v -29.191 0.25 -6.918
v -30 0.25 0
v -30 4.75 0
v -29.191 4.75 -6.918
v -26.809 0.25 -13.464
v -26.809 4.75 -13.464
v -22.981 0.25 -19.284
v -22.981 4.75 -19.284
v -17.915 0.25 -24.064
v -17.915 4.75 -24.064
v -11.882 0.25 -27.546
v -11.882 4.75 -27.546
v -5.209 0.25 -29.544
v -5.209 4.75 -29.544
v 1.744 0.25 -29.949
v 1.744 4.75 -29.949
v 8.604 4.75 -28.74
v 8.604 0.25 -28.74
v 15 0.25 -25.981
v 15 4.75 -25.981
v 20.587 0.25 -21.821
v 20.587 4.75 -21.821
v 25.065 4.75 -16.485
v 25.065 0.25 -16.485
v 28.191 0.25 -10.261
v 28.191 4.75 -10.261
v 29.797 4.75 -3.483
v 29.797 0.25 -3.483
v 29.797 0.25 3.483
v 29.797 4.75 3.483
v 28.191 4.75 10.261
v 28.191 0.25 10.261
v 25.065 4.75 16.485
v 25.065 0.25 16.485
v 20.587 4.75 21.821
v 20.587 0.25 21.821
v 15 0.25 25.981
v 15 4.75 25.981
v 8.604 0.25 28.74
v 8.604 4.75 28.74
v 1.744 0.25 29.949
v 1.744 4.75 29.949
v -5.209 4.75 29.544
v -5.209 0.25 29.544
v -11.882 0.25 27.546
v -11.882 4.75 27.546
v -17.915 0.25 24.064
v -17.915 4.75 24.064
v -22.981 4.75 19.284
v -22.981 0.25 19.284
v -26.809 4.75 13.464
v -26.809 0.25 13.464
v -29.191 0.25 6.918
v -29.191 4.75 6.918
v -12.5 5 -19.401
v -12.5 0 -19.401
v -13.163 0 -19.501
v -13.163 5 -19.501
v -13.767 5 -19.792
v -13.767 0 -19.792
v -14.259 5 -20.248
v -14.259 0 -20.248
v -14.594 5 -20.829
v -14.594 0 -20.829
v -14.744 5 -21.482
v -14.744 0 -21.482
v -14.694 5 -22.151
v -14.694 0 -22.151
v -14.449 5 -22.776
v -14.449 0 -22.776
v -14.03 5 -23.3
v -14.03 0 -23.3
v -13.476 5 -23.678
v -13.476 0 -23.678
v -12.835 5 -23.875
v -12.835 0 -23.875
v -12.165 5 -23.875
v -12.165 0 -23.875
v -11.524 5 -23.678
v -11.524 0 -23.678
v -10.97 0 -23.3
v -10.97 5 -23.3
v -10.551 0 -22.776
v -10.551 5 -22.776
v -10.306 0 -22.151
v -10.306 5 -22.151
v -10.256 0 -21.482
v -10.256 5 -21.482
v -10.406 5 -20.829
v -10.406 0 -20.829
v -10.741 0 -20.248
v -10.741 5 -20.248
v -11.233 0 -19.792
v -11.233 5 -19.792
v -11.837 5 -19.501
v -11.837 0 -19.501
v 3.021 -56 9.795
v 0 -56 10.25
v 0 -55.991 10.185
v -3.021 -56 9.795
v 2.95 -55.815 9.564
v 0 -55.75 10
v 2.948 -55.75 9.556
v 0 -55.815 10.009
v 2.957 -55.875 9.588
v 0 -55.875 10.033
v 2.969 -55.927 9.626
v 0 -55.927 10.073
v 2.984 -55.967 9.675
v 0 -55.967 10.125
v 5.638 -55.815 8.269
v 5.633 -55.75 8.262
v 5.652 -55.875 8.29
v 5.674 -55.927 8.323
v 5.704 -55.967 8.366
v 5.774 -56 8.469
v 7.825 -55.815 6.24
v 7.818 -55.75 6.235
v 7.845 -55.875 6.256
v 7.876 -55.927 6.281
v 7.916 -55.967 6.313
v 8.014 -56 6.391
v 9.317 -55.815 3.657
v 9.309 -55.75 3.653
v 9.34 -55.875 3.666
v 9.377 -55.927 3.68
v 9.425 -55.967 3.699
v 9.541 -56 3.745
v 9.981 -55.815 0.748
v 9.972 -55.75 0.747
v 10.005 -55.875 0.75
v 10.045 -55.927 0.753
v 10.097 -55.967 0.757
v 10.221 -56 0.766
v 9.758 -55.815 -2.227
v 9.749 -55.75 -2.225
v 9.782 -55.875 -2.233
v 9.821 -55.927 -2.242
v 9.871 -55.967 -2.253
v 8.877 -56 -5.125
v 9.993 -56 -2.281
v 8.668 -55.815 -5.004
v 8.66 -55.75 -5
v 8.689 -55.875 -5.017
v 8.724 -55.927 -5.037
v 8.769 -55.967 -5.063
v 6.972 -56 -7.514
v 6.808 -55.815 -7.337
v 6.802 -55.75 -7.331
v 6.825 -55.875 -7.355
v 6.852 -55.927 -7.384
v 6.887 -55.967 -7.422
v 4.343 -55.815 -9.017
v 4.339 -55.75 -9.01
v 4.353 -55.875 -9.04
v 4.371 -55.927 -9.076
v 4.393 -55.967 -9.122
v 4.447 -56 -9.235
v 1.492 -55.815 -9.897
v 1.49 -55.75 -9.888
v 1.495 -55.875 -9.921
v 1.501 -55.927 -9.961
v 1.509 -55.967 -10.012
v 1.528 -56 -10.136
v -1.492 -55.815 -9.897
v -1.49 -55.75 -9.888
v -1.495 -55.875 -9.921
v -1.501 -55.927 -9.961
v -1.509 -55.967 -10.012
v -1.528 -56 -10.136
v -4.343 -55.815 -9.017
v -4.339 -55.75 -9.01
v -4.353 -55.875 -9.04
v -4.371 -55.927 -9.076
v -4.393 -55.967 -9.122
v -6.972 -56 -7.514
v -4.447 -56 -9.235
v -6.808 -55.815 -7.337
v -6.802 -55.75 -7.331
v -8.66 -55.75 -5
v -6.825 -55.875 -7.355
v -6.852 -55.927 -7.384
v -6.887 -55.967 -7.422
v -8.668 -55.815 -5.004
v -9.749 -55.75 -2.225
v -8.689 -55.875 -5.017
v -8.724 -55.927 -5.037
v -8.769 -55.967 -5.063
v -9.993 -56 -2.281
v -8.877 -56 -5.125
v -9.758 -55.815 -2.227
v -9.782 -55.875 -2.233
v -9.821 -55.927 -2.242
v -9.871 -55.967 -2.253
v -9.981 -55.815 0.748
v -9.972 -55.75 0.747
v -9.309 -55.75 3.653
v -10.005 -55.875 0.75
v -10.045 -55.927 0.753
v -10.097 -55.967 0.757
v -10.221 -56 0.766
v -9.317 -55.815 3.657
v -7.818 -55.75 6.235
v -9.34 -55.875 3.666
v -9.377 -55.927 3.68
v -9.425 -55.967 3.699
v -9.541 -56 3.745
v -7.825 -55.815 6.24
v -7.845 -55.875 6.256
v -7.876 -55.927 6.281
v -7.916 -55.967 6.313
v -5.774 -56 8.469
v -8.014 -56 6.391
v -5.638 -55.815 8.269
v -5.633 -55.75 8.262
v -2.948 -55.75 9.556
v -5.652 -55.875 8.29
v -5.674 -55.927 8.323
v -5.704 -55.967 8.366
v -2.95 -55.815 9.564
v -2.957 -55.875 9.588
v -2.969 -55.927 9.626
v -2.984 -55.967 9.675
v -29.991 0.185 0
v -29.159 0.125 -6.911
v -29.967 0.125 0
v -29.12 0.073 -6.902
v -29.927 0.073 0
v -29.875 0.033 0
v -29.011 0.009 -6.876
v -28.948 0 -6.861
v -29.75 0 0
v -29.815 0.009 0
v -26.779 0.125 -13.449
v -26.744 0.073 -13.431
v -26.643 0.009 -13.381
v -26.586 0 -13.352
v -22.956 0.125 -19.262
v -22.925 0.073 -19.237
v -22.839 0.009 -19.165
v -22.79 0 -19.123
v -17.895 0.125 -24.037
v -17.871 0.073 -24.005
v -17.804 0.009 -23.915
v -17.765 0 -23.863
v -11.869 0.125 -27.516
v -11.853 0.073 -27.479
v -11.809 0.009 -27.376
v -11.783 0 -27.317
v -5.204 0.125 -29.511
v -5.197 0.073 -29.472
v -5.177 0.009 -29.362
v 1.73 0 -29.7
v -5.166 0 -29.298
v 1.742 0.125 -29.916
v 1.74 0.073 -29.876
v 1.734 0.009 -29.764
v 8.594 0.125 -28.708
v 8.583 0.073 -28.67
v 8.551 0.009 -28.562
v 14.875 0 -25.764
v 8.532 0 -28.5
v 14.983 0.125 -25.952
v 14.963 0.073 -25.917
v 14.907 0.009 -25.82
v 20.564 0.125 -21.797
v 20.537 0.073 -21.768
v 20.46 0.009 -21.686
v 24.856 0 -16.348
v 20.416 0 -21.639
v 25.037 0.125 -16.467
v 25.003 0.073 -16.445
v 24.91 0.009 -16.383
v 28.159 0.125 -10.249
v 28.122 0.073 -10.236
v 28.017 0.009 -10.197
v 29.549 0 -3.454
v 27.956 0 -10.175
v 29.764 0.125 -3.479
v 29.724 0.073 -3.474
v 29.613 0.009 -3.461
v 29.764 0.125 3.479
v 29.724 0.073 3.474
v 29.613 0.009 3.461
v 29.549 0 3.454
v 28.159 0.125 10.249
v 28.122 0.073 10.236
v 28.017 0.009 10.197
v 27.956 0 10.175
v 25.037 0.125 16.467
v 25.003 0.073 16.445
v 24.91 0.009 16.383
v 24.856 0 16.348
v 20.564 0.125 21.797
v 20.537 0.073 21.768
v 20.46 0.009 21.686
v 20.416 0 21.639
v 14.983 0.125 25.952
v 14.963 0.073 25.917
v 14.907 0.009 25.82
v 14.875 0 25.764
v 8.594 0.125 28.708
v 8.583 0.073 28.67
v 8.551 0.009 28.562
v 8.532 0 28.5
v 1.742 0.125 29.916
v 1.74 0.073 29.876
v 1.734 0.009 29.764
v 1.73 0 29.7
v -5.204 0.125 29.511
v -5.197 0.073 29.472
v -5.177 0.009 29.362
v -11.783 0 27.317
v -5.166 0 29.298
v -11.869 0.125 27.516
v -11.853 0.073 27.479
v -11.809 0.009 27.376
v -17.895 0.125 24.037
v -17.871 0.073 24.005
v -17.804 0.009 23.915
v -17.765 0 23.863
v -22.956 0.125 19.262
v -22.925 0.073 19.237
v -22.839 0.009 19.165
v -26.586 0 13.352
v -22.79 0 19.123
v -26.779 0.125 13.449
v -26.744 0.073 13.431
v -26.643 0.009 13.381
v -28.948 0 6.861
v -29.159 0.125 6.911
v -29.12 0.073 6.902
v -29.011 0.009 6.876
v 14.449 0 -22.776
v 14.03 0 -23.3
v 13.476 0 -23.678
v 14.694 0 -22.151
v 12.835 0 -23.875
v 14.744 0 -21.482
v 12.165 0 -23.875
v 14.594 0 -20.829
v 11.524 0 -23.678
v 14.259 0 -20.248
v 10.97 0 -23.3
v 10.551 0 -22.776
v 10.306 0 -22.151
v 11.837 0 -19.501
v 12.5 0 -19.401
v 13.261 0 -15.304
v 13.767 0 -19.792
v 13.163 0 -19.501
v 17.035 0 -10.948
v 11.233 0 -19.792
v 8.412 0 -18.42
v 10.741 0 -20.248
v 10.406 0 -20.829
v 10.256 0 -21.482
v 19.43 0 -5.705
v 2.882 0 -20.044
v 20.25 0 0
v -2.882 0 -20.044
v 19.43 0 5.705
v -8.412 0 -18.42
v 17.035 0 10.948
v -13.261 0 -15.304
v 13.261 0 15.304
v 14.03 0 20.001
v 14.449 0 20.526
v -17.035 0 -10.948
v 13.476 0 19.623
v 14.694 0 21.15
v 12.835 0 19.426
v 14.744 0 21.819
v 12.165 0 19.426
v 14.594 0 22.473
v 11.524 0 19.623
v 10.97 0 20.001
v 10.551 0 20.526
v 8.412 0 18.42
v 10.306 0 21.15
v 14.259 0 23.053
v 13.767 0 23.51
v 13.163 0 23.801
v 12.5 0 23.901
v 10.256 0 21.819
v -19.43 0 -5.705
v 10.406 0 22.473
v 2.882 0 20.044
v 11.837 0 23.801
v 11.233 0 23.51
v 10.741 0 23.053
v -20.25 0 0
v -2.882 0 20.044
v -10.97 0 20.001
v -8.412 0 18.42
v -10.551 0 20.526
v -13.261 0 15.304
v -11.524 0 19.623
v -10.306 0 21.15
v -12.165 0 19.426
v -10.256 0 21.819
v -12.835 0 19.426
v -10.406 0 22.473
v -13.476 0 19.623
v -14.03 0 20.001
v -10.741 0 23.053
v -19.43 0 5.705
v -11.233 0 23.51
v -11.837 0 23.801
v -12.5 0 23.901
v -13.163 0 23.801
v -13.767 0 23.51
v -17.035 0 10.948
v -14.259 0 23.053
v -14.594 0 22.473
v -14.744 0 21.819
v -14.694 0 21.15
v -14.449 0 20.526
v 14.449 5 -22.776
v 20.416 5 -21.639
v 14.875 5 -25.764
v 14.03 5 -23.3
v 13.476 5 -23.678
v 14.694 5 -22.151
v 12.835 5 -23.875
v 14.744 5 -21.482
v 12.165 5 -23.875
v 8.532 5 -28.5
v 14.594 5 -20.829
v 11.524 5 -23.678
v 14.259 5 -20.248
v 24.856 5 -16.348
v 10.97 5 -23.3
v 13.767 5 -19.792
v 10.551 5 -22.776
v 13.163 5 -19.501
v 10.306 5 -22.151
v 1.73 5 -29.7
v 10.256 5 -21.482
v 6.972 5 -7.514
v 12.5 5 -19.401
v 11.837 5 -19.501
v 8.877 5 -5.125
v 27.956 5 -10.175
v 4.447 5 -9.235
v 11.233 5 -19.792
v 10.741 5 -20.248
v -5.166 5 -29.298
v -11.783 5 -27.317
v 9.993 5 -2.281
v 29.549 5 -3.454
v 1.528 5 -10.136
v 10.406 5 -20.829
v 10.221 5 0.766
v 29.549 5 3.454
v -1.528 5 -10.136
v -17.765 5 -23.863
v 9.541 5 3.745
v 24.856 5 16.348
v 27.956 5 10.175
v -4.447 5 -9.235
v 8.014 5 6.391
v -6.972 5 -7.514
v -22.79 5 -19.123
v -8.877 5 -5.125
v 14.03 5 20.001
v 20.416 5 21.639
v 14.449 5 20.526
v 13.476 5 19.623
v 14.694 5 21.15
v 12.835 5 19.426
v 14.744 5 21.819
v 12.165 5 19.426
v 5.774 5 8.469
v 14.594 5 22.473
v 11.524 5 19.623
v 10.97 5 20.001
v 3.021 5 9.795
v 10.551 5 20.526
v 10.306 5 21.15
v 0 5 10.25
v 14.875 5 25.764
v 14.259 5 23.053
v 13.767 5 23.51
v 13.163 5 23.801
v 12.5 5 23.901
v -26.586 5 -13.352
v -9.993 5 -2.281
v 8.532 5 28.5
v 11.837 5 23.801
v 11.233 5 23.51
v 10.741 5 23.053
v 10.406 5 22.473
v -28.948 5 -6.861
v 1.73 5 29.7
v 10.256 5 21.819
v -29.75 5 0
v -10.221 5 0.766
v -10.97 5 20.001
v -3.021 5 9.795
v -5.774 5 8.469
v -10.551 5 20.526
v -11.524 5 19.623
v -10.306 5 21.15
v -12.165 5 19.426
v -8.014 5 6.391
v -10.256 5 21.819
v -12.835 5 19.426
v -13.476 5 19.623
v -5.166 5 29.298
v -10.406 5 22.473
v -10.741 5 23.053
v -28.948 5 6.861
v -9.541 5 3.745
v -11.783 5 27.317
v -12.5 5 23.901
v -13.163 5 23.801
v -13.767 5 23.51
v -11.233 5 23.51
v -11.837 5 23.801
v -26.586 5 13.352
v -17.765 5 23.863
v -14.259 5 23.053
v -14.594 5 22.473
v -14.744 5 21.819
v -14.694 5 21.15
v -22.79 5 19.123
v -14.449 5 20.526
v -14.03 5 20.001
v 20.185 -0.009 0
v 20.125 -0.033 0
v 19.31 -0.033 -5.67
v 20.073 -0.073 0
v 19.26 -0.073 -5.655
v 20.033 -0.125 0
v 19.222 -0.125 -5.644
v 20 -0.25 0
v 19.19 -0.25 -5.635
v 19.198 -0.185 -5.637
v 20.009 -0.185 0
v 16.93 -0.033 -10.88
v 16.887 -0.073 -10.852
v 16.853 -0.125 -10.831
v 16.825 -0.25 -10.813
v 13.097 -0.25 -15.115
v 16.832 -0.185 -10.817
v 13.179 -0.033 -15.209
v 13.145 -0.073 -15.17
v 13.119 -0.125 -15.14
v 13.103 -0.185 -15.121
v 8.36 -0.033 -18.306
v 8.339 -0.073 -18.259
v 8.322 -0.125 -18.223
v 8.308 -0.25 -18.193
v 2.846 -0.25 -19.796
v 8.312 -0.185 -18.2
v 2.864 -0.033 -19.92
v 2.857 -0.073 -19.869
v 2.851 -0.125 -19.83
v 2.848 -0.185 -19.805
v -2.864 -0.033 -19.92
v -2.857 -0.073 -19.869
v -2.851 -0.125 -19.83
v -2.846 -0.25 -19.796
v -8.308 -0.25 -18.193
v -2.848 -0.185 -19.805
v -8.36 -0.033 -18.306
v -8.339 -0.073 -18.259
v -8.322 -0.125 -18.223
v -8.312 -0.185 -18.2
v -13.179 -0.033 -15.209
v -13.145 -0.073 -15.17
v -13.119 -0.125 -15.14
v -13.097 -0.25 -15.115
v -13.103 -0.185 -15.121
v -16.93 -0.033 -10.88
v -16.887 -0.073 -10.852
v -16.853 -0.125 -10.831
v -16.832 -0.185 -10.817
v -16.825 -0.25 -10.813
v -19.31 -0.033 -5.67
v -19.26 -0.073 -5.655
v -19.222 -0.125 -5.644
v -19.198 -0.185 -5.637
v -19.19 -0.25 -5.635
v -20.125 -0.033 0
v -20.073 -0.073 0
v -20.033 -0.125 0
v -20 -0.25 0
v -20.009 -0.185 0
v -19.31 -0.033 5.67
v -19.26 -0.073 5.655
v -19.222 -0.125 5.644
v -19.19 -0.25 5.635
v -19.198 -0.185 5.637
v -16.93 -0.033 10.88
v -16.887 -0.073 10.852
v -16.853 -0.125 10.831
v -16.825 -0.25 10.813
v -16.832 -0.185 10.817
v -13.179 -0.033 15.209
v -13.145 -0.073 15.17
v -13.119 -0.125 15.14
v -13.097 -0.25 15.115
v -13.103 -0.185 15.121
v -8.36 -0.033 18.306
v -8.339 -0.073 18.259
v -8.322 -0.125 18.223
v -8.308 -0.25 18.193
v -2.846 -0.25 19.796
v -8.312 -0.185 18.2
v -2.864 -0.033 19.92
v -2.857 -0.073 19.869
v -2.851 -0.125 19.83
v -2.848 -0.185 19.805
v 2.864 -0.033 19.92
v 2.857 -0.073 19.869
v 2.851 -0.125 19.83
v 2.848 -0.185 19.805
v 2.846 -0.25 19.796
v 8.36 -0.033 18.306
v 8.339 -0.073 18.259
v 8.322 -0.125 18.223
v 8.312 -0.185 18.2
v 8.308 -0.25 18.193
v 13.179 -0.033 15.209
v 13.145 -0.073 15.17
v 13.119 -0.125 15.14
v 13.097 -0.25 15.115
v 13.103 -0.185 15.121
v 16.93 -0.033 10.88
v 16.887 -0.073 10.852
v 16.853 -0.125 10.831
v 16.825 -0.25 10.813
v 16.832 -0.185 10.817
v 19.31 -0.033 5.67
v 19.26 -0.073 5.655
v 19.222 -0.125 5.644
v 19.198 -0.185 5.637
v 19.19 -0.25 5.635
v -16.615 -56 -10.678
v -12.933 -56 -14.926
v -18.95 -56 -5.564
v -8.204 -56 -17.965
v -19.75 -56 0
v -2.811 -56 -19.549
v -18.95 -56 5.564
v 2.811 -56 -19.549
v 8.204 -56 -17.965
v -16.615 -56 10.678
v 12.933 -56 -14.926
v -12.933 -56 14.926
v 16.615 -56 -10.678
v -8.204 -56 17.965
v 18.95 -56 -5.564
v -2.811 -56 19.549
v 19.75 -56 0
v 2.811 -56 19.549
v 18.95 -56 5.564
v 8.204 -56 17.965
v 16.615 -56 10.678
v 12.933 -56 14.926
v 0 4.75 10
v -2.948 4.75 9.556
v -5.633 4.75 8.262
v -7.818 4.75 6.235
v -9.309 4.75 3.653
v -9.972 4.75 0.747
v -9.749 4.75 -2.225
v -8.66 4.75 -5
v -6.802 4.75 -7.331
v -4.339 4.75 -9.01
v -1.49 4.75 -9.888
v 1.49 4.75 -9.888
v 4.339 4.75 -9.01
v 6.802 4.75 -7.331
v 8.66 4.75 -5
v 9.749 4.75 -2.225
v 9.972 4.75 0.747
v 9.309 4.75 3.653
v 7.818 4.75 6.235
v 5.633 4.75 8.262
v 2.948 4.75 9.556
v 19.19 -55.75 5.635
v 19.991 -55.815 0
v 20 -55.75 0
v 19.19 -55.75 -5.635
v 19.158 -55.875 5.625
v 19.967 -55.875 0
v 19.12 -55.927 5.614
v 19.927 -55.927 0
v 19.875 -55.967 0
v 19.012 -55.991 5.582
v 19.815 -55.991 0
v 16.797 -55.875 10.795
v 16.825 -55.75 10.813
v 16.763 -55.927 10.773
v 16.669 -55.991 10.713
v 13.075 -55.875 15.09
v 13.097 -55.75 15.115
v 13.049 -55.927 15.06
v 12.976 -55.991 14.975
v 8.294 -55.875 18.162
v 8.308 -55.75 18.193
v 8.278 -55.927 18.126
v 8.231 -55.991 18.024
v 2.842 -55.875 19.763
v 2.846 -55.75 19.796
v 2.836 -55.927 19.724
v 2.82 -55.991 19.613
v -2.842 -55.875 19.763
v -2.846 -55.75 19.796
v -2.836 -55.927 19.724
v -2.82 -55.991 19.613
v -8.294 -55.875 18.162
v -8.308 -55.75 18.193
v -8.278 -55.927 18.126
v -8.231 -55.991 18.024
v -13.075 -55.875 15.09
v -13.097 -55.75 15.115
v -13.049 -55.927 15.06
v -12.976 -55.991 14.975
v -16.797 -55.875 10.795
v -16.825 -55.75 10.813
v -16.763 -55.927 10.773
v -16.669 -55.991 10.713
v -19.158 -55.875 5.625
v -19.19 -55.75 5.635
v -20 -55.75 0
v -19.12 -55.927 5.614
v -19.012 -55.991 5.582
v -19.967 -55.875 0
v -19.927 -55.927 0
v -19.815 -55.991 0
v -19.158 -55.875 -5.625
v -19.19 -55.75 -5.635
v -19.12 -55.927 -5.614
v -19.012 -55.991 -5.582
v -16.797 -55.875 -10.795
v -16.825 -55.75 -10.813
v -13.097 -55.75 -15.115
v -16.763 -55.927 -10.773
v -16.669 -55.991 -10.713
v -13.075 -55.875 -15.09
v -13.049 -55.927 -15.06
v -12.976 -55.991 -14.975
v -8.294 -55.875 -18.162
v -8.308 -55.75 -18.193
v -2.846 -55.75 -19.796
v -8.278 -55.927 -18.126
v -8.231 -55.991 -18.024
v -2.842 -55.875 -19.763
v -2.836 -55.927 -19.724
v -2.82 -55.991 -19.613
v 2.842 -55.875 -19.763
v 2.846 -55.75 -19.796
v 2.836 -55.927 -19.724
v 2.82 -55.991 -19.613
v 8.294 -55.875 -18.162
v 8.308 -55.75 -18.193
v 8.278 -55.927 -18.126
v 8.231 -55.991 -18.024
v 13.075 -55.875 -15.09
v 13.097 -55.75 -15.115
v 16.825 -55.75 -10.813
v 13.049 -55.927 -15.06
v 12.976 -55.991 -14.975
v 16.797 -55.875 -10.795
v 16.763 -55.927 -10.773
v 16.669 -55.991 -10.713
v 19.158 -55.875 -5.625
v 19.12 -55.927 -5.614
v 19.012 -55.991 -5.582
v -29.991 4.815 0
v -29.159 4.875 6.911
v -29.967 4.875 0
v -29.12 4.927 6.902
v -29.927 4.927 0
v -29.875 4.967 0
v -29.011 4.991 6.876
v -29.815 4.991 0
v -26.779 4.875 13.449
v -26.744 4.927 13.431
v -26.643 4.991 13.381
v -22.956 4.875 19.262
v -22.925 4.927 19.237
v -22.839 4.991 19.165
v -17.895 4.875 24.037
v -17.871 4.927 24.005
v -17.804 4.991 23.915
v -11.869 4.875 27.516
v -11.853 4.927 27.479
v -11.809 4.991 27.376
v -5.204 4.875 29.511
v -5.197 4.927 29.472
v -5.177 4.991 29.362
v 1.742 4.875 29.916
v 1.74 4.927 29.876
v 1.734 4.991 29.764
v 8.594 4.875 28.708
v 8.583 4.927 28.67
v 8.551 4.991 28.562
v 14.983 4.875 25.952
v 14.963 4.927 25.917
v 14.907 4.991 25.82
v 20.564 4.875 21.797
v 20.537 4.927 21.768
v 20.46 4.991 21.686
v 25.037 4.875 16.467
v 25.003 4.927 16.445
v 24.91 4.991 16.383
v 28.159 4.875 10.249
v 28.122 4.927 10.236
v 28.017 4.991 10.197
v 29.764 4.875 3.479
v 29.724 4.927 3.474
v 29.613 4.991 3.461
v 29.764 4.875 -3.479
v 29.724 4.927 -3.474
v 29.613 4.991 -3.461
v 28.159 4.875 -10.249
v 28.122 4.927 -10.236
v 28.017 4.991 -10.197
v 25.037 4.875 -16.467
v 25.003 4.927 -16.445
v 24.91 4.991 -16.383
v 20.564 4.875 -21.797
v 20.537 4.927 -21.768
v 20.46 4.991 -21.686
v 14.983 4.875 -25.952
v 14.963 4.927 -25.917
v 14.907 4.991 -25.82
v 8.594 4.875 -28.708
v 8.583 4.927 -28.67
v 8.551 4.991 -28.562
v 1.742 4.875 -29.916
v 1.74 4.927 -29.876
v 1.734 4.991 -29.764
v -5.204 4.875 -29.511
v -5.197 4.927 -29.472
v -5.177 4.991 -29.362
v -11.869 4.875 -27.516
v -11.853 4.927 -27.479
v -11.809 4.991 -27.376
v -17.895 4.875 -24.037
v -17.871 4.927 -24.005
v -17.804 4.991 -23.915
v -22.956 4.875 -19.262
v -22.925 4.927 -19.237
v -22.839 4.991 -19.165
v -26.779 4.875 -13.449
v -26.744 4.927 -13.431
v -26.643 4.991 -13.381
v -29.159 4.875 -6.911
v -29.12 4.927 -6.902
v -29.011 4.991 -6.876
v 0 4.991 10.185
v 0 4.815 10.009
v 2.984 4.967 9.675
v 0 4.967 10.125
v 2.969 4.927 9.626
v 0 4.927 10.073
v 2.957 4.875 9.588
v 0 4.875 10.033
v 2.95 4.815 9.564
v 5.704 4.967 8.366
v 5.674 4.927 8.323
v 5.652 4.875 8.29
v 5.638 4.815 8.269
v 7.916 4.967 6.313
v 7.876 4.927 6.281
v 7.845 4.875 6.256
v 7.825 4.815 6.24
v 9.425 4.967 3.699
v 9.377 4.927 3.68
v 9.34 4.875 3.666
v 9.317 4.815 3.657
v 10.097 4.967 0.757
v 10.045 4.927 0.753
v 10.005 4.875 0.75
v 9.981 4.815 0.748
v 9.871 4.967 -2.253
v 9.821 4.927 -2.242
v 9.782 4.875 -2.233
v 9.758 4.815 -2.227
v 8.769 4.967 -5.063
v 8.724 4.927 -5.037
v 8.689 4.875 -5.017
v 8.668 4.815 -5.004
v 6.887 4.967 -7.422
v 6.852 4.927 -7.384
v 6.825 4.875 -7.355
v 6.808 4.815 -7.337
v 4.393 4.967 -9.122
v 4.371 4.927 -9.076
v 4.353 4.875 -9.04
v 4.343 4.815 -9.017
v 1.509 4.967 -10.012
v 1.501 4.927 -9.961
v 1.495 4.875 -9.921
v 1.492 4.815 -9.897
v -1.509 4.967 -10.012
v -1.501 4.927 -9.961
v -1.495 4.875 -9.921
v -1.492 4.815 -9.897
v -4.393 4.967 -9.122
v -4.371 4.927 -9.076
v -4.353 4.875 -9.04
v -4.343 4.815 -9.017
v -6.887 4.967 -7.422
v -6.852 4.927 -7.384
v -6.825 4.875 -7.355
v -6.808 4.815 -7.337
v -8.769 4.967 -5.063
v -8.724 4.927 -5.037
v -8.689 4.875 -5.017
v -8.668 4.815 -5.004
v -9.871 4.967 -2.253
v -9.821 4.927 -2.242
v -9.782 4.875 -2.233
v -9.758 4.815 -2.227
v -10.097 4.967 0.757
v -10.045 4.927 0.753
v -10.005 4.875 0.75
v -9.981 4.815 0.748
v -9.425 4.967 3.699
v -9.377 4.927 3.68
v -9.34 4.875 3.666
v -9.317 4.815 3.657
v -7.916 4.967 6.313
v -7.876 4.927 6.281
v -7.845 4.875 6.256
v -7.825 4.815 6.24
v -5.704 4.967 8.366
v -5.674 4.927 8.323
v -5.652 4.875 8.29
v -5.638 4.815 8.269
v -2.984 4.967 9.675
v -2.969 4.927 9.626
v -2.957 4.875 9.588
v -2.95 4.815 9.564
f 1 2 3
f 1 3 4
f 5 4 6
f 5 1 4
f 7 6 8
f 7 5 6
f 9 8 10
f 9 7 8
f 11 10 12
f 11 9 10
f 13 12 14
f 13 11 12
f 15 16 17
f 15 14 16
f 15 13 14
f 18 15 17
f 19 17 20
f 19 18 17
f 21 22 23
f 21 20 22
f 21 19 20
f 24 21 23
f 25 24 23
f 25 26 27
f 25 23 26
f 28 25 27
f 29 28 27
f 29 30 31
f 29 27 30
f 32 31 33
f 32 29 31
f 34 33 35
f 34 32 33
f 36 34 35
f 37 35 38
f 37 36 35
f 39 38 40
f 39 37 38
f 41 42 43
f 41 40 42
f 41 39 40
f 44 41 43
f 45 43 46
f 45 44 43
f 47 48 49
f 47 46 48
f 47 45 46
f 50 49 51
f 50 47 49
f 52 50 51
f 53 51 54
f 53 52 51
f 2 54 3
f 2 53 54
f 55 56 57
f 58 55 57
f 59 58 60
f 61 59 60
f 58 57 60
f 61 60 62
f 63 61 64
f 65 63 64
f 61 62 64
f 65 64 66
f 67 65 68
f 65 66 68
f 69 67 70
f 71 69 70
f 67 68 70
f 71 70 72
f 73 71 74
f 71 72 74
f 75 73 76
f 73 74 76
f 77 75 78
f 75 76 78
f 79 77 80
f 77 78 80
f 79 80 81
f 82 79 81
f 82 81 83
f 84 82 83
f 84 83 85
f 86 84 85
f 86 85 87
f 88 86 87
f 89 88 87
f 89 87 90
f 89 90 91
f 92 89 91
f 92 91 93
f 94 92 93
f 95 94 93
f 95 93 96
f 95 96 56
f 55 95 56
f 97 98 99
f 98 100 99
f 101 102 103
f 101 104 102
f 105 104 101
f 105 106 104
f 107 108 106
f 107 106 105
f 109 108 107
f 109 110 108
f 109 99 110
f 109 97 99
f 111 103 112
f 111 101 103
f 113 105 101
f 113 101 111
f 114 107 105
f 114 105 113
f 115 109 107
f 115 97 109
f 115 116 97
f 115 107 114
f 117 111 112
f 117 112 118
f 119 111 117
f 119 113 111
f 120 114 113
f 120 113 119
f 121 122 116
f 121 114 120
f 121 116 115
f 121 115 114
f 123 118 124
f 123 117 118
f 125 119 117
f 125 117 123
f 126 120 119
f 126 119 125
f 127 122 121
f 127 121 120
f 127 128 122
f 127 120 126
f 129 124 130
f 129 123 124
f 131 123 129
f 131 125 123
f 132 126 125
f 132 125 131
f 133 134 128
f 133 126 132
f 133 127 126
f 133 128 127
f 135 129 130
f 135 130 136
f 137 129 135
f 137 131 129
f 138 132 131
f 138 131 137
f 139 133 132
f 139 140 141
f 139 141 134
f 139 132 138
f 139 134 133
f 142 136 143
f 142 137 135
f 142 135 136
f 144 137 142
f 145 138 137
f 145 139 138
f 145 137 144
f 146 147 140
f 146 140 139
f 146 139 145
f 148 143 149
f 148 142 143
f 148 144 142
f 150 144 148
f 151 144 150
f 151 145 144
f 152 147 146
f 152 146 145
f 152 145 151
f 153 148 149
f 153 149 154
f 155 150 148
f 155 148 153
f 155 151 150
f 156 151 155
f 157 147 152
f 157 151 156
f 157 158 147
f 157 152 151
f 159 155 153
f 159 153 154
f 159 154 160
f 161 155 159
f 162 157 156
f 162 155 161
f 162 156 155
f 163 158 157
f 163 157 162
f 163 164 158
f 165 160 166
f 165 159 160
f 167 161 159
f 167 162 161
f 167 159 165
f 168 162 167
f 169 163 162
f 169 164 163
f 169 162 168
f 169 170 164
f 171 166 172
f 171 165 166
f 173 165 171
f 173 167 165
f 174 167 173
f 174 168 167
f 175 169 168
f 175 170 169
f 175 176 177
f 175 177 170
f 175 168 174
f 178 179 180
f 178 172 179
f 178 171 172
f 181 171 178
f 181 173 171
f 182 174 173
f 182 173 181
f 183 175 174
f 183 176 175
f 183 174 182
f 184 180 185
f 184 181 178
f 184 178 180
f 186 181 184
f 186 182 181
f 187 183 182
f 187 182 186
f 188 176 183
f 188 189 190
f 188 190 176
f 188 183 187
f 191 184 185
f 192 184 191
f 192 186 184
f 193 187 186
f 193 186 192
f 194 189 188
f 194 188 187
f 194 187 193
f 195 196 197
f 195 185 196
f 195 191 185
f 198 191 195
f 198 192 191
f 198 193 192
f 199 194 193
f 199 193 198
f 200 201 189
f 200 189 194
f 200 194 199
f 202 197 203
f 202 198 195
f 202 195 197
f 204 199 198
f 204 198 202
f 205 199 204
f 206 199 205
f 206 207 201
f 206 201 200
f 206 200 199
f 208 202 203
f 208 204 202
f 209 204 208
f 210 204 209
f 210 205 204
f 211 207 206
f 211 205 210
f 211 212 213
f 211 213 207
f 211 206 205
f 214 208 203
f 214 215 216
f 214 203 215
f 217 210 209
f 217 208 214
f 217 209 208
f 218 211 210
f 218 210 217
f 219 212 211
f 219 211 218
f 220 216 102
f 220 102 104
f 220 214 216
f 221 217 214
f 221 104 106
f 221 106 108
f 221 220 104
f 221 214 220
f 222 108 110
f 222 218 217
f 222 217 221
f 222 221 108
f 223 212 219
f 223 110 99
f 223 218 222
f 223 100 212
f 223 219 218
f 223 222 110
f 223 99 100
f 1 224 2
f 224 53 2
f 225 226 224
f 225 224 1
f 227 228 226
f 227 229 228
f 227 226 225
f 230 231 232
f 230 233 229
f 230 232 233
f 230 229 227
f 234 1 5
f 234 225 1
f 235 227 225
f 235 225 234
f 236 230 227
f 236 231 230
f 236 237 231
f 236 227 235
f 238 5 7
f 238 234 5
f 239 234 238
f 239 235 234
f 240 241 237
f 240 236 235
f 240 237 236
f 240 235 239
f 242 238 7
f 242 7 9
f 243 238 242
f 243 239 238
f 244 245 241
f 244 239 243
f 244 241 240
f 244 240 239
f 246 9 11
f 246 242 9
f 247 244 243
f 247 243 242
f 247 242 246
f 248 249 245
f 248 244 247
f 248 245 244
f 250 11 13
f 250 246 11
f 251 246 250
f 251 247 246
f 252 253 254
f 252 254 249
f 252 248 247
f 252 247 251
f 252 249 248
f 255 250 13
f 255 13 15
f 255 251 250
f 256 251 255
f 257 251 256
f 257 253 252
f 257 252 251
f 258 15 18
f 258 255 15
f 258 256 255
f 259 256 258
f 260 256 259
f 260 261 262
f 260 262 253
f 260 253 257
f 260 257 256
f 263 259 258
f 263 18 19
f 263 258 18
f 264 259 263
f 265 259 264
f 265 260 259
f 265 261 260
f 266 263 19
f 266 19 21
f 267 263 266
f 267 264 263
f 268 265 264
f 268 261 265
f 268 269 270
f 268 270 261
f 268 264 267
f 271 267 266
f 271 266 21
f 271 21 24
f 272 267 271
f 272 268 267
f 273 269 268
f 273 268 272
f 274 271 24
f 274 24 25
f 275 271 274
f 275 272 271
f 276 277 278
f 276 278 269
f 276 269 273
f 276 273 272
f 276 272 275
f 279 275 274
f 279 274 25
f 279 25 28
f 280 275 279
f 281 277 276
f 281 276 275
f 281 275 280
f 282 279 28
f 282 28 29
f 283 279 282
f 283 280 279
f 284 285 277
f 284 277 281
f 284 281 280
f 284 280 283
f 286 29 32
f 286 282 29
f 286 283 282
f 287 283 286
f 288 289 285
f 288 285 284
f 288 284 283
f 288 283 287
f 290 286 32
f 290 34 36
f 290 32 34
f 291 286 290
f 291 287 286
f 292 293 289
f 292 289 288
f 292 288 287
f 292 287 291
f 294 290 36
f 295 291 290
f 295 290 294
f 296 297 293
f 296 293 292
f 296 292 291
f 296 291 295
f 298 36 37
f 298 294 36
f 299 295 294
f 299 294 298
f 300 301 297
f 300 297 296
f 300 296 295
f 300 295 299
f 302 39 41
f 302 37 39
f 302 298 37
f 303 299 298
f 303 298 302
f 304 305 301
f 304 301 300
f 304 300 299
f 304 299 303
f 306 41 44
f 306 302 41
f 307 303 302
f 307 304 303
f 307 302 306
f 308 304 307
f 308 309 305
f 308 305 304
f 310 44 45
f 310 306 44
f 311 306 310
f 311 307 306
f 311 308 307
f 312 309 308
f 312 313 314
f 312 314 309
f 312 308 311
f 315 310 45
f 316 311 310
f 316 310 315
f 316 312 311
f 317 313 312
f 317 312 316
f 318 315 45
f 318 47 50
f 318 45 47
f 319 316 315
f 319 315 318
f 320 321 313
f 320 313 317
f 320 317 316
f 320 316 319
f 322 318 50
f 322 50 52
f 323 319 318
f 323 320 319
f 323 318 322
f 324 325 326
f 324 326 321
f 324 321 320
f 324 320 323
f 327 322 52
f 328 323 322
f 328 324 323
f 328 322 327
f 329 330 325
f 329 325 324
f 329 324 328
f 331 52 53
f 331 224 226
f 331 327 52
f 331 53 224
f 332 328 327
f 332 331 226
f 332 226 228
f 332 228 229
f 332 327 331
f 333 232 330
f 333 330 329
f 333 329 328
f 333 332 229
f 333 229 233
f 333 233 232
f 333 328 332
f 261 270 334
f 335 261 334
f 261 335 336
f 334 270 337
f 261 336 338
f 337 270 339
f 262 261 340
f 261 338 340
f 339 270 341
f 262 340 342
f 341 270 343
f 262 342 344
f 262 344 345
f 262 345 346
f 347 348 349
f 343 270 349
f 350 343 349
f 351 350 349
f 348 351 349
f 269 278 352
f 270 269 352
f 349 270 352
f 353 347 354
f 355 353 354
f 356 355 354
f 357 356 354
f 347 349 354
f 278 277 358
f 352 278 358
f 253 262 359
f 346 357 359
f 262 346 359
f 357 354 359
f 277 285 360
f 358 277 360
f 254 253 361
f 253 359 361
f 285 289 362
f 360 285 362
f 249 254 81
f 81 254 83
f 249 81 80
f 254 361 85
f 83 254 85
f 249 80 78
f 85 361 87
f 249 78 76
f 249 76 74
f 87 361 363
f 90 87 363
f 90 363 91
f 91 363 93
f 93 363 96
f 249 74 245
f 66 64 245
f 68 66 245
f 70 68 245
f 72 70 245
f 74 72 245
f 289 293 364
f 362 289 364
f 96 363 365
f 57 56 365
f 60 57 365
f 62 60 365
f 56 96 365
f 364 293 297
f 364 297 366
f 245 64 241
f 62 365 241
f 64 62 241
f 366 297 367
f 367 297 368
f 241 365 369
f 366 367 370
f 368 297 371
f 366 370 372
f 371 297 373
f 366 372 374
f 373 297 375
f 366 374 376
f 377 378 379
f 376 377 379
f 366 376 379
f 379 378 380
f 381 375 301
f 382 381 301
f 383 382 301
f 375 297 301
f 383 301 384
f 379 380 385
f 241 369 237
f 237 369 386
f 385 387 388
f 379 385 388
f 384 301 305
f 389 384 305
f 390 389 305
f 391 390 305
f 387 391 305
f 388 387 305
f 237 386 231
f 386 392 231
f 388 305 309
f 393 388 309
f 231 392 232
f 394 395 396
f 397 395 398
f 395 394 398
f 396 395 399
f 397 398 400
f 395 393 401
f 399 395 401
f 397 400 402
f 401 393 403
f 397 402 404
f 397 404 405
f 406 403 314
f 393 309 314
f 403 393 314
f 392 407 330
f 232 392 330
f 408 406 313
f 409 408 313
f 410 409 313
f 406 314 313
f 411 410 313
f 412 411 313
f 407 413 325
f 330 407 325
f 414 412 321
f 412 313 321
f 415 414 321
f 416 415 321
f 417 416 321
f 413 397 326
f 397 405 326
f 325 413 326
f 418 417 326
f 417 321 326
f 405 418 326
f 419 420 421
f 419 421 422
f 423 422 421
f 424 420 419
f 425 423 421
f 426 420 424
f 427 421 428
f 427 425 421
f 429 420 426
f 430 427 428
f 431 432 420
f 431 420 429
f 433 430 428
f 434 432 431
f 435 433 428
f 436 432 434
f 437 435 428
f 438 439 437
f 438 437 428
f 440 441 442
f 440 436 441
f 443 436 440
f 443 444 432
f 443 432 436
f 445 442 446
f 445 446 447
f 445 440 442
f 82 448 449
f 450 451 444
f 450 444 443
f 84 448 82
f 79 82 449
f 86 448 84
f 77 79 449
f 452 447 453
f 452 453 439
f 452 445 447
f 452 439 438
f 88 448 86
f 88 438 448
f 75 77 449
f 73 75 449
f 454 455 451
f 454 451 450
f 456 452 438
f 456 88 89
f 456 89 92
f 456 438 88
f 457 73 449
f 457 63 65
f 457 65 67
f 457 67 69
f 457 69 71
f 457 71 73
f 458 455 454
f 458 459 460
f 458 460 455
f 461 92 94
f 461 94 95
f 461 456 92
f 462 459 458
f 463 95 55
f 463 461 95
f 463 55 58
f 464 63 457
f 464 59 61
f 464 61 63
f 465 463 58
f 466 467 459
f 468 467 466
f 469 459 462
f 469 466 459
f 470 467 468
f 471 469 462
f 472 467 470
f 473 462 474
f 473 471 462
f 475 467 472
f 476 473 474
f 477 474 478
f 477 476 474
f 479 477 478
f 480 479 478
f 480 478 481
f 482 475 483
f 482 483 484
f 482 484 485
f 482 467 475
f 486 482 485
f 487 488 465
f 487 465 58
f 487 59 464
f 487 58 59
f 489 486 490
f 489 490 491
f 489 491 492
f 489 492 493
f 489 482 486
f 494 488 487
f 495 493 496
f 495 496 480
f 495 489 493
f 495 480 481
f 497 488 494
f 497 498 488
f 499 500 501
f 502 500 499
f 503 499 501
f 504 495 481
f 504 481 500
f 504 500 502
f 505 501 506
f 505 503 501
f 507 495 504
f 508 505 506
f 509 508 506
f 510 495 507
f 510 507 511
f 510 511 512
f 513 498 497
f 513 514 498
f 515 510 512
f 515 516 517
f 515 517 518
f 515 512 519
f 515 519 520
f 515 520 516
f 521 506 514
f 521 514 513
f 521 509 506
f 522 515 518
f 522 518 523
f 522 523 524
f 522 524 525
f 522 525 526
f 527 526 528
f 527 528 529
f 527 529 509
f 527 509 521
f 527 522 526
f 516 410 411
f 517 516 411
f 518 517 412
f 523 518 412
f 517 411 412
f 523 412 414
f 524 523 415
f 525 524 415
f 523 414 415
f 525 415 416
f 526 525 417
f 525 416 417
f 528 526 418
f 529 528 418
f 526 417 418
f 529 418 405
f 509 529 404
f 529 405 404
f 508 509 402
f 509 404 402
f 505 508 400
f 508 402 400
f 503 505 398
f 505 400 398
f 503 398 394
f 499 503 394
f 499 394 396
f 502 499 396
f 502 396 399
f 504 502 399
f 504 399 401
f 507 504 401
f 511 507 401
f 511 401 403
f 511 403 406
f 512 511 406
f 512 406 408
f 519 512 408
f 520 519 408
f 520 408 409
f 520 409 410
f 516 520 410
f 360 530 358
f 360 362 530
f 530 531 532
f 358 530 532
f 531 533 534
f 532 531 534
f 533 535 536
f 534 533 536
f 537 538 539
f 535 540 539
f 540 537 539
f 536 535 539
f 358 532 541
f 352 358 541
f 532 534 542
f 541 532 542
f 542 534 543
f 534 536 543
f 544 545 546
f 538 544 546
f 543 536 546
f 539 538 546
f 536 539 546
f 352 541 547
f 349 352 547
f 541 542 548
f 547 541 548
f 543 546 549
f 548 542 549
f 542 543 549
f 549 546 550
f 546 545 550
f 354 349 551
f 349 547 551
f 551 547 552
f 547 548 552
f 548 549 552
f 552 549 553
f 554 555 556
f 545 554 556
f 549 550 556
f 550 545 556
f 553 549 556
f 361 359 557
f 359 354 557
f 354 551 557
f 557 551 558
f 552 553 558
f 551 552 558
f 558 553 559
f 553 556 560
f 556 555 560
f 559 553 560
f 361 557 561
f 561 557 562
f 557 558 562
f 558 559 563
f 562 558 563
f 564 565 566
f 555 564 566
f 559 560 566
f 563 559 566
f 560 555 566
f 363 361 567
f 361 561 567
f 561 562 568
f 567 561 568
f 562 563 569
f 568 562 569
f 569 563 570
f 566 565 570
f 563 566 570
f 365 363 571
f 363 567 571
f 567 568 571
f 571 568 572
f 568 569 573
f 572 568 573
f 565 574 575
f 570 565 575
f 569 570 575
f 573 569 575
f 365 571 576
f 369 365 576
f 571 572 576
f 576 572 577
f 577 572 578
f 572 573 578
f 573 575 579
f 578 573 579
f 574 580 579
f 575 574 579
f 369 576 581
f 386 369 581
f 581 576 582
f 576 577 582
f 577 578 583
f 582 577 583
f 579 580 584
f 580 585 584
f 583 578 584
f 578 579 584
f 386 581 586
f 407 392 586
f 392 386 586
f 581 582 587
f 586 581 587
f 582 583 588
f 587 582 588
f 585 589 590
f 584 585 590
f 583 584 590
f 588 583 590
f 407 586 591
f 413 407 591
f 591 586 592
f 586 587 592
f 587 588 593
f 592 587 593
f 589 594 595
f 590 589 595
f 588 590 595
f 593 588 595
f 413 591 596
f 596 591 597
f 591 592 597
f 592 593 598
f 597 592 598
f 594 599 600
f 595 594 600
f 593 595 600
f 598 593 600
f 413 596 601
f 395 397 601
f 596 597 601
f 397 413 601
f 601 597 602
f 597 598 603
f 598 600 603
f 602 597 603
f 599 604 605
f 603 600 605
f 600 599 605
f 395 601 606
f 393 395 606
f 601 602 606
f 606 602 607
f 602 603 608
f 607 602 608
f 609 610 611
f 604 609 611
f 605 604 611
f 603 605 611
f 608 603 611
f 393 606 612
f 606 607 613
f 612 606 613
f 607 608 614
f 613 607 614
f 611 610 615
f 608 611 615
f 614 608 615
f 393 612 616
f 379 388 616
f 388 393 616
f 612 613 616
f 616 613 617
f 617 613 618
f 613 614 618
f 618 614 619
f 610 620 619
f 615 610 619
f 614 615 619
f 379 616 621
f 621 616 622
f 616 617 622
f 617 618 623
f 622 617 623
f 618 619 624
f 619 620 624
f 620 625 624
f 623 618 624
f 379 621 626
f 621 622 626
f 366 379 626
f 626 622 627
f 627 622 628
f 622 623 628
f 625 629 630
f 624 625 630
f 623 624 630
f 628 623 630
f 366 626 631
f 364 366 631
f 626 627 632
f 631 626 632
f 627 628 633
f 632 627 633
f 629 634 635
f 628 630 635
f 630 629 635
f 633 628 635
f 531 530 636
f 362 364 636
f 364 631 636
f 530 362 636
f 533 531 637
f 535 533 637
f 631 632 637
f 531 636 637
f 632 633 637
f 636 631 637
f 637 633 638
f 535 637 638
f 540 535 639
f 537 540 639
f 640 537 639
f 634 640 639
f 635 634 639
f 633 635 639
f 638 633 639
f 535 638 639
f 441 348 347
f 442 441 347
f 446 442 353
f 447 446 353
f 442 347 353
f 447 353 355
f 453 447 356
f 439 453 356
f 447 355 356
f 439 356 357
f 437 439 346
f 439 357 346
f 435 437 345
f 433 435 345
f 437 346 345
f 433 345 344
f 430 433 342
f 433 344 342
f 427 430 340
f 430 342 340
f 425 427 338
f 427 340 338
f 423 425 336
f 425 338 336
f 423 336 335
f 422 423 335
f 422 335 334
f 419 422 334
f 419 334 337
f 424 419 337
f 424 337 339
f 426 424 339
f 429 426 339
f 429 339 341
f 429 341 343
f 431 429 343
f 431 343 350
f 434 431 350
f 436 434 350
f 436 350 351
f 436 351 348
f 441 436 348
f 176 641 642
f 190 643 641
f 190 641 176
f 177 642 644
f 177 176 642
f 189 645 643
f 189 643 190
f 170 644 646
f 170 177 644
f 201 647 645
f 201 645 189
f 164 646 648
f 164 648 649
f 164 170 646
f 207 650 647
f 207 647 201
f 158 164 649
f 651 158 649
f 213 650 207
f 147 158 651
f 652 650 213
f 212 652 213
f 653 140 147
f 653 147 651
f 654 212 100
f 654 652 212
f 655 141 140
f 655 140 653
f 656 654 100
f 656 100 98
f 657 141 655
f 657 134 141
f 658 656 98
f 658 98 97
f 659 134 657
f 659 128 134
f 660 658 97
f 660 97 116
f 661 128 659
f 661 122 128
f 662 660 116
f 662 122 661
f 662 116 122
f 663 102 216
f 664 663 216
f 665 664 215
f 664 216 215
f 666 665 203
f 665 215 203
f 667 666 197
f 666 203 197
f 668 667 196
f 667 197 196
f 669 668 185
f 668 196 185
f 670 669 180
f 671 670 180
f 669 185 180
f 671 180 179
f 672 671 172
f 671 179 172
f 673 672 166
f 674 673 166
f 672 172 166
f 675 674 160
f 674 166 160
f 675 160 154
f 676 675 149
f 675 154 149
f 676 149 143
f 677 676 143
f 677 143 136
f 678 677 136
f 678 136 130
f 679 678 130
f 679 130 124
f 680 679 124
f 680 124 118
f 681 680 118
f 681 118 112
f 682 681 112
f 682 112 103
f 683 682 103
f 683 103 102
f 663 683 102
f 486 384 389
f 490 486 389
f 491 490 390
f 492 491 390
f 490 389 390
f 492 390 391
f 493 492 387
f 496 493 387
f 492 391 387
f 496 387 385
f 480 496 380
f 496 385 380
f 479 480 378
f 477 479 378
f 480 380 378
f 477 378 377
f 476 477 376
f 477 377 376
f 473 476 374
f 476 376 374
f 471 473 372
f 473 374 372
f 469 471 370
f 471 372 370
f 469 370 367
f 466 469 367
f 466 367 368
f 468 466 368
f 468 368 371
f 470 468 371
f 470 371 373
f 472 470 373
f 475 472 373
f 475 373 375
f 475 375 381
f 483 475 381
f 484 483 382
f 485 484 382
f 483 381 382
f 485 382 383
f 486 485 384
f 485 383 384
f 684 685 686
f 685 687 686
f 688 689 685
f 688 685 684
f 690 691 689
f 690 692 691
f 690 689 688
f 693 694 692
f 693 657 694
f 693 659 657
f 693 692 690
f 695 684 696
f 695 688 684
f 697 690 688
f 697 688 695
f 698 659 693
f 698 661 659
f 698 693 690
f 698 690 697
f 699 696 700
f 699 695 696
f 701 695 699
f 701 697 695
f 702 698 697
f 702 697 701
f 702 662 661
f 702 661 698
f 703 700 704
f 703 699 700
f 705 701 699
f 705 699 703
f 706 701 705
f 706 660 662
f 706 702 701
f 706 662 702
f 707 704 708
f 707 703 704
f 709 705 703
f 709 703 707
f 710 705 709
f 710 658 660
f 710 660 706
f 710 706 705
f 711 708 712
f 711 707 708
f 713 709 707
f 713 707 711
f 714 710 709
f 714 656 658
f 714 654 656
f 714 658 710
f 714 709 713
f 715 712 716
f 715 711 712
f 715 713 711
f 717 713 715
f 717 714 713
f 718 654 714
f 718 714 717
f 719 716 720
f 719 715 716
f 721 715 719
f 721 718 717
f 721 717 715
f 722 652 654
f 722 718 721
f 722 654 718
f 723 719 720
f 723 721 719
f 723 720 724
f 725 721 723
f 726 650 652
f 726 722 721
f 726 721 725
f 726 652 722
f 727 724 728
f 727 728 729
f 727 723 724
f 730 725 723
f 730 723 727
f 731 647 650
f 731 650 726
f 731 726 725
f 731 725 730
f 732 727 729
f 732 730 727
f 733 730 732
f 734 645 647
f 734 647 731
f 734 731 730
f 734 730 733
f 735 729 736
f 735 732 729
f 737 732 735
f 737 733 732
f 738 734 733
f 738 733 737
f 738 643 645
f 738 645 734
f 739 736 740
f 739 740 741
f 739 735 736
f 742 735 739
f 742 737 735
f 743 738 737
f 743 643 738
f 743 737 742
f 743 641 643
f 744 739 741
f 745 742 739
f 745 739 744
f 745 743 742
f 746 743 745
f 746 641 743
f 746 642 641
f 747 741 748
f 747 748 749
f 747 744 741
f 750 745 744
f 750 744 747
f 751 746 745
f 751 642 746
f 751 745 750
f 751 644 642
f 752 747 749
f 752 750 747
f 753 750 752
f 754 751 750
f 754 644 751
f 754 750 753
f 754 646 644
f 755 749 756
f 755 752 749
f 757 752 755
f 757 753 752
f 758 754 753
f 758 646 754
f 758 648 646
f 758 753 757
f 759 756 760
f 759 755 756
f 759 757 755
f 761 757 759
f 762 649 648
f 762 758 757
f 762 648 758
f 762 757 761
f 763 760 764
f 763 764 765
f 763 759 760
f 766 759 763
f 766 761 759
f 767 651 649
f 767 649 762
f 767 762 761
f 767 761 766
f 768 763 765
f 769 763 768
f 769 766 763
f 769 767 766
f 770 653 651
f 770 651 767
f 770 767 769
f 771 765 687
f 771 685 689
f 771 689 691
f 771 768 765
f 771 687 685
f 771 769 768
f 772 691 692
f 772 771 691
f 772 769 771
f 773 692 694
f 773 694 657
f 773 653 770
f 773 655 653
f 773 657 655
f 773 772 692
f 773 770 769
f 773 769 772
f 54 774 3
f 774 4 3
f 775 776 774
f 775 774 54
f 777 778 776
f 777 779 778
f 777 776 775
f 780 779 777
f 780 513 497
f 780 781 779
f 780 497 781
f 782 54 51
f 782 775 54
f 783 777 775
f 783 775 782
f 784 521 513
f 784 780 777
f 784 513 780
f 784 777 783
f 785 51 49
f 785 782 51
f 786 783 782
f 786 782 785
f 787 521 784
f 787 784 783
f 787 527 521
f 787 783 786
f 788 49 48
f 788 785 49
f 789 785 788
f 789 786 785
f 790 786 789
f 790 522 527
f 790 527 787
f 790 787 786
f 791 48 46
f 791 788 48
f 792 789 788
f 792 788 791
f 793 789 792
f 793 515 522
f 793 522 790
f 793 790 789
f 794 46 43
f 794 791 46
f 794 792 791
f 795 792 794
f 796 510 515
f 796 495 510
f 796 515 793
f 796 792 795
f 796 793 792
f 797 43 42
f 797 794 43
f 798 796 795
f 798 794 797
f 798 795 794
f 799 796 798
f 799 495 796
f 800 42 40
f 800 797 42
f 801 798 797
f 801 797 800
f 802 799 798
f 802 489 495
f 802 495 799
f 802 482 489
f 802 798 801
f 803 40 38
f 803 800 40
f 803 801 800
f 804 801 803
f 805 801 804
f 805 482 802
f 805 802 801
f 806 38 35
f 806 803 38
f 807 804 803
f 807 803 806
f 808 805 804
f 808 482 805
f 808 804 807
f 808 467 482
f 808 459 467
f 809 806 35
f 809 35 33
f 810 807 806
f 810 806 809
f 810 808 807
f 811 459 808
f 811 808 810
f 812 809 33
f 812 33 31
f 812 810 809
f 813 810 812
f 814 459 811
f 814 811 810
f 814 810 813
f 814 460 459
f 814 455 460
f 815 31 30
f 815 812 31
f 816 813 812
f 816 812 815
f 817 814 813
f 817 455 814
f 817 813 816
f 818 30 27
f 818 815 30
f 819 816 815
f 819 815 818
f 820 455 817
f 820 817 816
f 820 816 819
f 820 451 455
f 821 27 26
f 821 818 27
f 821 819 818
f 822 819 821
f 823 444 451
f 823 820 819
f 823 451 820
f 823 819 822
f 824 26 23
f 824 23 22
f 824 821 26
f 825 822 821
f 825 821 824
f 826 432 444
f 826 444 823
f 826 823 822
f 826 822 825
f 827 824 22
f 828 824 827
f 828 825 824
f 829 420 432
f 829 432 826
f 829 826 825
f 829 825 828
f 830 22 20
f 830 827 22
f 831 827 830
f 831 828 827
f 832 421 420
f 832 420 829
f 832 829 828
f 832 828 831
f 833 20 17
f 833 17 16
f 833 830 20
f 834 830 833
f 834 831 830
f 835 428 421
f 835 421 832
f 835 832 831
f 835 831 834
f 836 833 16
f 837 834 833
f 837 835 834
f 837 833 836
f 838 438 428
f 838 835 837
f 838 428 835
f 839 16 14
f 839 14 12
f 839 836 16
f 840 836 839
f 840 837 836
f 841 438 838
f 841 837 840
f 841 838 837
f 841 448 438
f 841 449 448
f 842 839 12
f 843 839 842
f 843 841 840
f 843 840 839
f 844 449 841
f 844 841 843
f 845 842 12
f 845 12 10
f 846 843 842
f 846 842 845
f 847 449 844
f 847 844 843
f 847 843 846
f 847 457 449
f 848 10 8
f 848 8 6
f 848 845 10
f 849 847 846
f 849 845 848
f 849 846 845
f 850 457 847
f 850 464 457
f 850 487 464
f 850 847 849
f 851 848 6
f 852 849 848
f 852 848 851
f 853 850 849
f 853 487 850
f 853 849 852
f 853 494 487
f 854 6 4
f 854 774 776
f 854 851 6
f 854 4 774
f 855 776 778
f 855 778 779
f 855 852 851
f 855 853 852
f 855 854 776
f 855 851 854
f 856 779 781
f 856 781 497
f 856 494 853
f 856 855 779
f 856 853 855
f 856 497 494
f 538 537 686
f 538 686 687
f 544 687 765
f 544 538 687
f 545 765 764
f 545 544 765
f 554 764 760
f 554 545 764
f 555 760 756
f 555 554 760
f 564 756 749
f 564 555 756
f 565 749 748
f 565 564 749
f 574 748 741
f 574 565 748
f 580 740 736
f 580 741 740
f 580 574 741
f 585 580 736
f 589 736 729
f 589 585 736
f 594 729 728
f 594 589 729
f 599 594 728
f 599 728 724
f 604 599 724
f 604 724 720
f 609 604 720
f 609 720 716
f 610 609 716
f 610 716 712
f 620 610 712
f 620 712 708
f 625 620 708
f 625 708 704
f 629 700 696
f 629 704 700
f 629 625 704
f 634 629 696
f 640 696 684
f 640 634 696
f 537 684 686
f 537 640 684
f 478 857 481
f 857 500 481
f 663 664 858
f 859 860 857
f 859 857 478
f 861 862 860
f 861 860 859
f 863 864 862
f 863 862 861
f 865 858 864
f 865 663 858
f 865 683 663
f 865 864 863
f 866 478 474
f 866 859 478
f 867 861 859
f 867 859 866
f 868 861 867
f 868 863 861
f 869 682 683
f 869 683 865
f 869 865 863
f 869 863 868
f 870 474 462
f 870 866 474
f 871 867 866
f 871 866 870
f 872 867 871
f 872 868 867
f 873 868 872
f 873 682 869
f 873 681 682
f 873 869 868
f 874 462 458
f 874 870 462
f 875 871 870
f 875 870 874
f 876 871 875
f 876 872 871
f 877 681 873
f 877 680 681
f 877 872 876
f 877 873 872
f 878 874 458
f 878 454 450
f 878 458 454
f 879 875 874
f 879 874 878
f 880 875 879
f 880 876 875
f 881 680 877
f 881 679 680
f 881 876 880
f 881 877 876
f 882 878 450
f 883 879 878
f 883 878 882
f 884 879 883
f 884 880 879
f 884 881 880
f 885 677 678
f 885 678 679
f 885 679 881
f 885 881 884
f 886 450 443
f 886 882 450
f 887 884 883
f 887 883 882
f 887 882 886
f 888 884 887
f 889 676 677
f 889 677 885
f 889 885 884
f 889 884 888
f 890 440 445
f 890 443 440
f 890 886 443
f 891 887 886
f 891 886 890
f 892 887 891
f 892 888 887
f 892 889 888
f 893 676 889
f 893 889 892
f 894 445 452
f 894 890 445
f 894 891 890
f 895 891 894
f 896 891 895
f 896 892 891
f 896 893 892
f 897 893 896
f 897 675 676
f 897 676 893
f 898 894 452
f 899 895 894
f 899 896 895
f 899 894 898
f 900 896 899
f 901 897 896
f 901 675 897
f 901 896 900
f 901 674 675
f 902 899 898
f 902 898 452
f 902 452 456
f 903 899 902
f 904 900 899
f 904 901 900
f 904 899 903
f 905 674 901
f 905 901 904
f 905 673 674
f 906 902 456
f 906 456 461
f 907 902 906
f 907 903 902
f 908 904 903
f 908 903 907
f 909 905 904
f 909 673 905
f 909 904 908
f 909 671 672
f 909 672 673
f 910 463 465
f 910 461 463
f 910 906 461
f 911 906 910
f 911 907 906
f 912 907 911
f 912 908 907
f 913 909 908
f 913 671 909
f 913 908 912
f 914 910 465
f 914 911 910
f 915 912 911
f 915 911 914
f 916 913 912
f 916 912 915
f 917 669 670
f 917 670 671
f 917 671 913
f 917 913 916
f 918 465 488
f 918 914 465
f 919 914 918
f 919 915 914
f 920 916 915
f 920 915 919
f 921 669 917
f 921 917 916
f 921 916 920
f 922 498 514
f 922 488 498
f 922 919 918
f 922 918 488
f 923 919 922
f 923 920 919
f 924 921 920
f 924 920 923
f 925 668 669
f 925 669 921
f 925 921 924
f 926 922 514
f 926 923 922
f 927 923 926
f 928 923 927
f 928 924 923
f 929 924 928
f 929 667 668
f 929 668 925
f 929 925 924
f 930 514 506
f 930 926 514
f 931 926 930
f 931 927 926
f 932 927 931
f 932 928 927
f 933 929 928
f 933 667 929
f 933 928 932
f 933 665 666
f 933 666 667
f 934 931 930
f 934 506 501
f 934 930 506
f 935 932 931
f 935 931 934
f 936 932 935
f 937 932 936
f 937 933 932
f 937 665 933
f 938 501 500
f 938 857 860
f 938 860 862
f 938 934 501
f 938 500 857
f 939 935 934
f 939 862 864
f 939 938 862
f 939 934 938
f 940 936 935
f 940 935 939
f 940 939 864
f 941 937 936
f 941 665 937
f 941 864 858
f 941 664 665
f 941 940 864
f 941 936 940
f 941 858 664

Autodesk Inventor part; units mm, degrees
ref_plane "YZ Plane" through (0, 0, 0) normal (1, 0, 0) x (0, 1, 0)
ref_plane "XZ Plane" through (0, 0, 0) normal (0, 1, 0) x (-1, 0, 0)
ref_plane "XY Plane" through (0, 0, 0) normal (0, 0, 1) x (1, 0, 0)
sketch "Sketch1" plane through (0, 0, 0) normal (0, 1, 0) x (-1, 0, 0)
  circle A0 centre (0, 0) radius 30
  dimension "d0" = 60
extrude "Extrusion1" add sketch "Sketch1" along normal blind 5
sketch "Sketch2" plane through (0, 0, 0) normal (0, -1, 0) x (1, 0, 0)
  circle A0 centre (0, 0) radius 20
  dimension "d3" = 40
extrude "Extrusion2" add sketch "Sketch2" along normal blind 56
sketch "Sketch3" plane through (0, 5, 0) normal (0, 1, 0) x (1, 0, 0)
  circle A0 centre (0, 0) radius 2.5 construction
  dimension "d6" = 5
hole "Hole1" at (0, 5, 0) direction (0, -1, 0) diameter 20 end through all
thread "Thread1" size "M20x2.5" class "6H" standard "ANSI Metric M Profile" full length
sketch "Sketch4" plane through (0, 5, 0) normal (0, 1, 0) x (1, 0, 0)
  line L0 (0, 0) -> (0, 50) construction
  line L1 (0, 0) -> (25, 43.3013) construction
  line L2 (0, 0) -> (-25, 43.3013) construction
  circle A0 centre (0, 0) radius 25 construction
  circle A1 centre (12.5, 21.6506) radius 2 construction
  circle A2 centre (-12.5, 21.6506) radius 2 construction
  line L3 (0, 0) -> (25, 0) construction
  circle A3 centre (12.5, -21.6506) radius 2 construction
  circle A4 centre (-12.5, -21.6506) radius 2 construction
  dimension "d16" = 50
  dimension "d17" = 50
  dimension "d18" = 30
  dimension "d19" = 50
  dimension "d20" = 4
  dimension "d21" = 4
hole "Hole2" at (12.5, 5, -21.6506) at (-12.5, 5, -21.6506) at (12.5, 5, 21.6506) at (-12.5, 5, 21.6506) direction (0, -1, 0) diameter 4.5 end through all
fillet "Fillet1" radius 0.25 6 edges at (30, 0, 0) (30, 5, 0) (-20, -56, 0) (0, -56, -10) (-20, 0, 0) (0, 5, -10)
properties part number "RNFBL2005A2.5S" material "Steel, Carbon"
